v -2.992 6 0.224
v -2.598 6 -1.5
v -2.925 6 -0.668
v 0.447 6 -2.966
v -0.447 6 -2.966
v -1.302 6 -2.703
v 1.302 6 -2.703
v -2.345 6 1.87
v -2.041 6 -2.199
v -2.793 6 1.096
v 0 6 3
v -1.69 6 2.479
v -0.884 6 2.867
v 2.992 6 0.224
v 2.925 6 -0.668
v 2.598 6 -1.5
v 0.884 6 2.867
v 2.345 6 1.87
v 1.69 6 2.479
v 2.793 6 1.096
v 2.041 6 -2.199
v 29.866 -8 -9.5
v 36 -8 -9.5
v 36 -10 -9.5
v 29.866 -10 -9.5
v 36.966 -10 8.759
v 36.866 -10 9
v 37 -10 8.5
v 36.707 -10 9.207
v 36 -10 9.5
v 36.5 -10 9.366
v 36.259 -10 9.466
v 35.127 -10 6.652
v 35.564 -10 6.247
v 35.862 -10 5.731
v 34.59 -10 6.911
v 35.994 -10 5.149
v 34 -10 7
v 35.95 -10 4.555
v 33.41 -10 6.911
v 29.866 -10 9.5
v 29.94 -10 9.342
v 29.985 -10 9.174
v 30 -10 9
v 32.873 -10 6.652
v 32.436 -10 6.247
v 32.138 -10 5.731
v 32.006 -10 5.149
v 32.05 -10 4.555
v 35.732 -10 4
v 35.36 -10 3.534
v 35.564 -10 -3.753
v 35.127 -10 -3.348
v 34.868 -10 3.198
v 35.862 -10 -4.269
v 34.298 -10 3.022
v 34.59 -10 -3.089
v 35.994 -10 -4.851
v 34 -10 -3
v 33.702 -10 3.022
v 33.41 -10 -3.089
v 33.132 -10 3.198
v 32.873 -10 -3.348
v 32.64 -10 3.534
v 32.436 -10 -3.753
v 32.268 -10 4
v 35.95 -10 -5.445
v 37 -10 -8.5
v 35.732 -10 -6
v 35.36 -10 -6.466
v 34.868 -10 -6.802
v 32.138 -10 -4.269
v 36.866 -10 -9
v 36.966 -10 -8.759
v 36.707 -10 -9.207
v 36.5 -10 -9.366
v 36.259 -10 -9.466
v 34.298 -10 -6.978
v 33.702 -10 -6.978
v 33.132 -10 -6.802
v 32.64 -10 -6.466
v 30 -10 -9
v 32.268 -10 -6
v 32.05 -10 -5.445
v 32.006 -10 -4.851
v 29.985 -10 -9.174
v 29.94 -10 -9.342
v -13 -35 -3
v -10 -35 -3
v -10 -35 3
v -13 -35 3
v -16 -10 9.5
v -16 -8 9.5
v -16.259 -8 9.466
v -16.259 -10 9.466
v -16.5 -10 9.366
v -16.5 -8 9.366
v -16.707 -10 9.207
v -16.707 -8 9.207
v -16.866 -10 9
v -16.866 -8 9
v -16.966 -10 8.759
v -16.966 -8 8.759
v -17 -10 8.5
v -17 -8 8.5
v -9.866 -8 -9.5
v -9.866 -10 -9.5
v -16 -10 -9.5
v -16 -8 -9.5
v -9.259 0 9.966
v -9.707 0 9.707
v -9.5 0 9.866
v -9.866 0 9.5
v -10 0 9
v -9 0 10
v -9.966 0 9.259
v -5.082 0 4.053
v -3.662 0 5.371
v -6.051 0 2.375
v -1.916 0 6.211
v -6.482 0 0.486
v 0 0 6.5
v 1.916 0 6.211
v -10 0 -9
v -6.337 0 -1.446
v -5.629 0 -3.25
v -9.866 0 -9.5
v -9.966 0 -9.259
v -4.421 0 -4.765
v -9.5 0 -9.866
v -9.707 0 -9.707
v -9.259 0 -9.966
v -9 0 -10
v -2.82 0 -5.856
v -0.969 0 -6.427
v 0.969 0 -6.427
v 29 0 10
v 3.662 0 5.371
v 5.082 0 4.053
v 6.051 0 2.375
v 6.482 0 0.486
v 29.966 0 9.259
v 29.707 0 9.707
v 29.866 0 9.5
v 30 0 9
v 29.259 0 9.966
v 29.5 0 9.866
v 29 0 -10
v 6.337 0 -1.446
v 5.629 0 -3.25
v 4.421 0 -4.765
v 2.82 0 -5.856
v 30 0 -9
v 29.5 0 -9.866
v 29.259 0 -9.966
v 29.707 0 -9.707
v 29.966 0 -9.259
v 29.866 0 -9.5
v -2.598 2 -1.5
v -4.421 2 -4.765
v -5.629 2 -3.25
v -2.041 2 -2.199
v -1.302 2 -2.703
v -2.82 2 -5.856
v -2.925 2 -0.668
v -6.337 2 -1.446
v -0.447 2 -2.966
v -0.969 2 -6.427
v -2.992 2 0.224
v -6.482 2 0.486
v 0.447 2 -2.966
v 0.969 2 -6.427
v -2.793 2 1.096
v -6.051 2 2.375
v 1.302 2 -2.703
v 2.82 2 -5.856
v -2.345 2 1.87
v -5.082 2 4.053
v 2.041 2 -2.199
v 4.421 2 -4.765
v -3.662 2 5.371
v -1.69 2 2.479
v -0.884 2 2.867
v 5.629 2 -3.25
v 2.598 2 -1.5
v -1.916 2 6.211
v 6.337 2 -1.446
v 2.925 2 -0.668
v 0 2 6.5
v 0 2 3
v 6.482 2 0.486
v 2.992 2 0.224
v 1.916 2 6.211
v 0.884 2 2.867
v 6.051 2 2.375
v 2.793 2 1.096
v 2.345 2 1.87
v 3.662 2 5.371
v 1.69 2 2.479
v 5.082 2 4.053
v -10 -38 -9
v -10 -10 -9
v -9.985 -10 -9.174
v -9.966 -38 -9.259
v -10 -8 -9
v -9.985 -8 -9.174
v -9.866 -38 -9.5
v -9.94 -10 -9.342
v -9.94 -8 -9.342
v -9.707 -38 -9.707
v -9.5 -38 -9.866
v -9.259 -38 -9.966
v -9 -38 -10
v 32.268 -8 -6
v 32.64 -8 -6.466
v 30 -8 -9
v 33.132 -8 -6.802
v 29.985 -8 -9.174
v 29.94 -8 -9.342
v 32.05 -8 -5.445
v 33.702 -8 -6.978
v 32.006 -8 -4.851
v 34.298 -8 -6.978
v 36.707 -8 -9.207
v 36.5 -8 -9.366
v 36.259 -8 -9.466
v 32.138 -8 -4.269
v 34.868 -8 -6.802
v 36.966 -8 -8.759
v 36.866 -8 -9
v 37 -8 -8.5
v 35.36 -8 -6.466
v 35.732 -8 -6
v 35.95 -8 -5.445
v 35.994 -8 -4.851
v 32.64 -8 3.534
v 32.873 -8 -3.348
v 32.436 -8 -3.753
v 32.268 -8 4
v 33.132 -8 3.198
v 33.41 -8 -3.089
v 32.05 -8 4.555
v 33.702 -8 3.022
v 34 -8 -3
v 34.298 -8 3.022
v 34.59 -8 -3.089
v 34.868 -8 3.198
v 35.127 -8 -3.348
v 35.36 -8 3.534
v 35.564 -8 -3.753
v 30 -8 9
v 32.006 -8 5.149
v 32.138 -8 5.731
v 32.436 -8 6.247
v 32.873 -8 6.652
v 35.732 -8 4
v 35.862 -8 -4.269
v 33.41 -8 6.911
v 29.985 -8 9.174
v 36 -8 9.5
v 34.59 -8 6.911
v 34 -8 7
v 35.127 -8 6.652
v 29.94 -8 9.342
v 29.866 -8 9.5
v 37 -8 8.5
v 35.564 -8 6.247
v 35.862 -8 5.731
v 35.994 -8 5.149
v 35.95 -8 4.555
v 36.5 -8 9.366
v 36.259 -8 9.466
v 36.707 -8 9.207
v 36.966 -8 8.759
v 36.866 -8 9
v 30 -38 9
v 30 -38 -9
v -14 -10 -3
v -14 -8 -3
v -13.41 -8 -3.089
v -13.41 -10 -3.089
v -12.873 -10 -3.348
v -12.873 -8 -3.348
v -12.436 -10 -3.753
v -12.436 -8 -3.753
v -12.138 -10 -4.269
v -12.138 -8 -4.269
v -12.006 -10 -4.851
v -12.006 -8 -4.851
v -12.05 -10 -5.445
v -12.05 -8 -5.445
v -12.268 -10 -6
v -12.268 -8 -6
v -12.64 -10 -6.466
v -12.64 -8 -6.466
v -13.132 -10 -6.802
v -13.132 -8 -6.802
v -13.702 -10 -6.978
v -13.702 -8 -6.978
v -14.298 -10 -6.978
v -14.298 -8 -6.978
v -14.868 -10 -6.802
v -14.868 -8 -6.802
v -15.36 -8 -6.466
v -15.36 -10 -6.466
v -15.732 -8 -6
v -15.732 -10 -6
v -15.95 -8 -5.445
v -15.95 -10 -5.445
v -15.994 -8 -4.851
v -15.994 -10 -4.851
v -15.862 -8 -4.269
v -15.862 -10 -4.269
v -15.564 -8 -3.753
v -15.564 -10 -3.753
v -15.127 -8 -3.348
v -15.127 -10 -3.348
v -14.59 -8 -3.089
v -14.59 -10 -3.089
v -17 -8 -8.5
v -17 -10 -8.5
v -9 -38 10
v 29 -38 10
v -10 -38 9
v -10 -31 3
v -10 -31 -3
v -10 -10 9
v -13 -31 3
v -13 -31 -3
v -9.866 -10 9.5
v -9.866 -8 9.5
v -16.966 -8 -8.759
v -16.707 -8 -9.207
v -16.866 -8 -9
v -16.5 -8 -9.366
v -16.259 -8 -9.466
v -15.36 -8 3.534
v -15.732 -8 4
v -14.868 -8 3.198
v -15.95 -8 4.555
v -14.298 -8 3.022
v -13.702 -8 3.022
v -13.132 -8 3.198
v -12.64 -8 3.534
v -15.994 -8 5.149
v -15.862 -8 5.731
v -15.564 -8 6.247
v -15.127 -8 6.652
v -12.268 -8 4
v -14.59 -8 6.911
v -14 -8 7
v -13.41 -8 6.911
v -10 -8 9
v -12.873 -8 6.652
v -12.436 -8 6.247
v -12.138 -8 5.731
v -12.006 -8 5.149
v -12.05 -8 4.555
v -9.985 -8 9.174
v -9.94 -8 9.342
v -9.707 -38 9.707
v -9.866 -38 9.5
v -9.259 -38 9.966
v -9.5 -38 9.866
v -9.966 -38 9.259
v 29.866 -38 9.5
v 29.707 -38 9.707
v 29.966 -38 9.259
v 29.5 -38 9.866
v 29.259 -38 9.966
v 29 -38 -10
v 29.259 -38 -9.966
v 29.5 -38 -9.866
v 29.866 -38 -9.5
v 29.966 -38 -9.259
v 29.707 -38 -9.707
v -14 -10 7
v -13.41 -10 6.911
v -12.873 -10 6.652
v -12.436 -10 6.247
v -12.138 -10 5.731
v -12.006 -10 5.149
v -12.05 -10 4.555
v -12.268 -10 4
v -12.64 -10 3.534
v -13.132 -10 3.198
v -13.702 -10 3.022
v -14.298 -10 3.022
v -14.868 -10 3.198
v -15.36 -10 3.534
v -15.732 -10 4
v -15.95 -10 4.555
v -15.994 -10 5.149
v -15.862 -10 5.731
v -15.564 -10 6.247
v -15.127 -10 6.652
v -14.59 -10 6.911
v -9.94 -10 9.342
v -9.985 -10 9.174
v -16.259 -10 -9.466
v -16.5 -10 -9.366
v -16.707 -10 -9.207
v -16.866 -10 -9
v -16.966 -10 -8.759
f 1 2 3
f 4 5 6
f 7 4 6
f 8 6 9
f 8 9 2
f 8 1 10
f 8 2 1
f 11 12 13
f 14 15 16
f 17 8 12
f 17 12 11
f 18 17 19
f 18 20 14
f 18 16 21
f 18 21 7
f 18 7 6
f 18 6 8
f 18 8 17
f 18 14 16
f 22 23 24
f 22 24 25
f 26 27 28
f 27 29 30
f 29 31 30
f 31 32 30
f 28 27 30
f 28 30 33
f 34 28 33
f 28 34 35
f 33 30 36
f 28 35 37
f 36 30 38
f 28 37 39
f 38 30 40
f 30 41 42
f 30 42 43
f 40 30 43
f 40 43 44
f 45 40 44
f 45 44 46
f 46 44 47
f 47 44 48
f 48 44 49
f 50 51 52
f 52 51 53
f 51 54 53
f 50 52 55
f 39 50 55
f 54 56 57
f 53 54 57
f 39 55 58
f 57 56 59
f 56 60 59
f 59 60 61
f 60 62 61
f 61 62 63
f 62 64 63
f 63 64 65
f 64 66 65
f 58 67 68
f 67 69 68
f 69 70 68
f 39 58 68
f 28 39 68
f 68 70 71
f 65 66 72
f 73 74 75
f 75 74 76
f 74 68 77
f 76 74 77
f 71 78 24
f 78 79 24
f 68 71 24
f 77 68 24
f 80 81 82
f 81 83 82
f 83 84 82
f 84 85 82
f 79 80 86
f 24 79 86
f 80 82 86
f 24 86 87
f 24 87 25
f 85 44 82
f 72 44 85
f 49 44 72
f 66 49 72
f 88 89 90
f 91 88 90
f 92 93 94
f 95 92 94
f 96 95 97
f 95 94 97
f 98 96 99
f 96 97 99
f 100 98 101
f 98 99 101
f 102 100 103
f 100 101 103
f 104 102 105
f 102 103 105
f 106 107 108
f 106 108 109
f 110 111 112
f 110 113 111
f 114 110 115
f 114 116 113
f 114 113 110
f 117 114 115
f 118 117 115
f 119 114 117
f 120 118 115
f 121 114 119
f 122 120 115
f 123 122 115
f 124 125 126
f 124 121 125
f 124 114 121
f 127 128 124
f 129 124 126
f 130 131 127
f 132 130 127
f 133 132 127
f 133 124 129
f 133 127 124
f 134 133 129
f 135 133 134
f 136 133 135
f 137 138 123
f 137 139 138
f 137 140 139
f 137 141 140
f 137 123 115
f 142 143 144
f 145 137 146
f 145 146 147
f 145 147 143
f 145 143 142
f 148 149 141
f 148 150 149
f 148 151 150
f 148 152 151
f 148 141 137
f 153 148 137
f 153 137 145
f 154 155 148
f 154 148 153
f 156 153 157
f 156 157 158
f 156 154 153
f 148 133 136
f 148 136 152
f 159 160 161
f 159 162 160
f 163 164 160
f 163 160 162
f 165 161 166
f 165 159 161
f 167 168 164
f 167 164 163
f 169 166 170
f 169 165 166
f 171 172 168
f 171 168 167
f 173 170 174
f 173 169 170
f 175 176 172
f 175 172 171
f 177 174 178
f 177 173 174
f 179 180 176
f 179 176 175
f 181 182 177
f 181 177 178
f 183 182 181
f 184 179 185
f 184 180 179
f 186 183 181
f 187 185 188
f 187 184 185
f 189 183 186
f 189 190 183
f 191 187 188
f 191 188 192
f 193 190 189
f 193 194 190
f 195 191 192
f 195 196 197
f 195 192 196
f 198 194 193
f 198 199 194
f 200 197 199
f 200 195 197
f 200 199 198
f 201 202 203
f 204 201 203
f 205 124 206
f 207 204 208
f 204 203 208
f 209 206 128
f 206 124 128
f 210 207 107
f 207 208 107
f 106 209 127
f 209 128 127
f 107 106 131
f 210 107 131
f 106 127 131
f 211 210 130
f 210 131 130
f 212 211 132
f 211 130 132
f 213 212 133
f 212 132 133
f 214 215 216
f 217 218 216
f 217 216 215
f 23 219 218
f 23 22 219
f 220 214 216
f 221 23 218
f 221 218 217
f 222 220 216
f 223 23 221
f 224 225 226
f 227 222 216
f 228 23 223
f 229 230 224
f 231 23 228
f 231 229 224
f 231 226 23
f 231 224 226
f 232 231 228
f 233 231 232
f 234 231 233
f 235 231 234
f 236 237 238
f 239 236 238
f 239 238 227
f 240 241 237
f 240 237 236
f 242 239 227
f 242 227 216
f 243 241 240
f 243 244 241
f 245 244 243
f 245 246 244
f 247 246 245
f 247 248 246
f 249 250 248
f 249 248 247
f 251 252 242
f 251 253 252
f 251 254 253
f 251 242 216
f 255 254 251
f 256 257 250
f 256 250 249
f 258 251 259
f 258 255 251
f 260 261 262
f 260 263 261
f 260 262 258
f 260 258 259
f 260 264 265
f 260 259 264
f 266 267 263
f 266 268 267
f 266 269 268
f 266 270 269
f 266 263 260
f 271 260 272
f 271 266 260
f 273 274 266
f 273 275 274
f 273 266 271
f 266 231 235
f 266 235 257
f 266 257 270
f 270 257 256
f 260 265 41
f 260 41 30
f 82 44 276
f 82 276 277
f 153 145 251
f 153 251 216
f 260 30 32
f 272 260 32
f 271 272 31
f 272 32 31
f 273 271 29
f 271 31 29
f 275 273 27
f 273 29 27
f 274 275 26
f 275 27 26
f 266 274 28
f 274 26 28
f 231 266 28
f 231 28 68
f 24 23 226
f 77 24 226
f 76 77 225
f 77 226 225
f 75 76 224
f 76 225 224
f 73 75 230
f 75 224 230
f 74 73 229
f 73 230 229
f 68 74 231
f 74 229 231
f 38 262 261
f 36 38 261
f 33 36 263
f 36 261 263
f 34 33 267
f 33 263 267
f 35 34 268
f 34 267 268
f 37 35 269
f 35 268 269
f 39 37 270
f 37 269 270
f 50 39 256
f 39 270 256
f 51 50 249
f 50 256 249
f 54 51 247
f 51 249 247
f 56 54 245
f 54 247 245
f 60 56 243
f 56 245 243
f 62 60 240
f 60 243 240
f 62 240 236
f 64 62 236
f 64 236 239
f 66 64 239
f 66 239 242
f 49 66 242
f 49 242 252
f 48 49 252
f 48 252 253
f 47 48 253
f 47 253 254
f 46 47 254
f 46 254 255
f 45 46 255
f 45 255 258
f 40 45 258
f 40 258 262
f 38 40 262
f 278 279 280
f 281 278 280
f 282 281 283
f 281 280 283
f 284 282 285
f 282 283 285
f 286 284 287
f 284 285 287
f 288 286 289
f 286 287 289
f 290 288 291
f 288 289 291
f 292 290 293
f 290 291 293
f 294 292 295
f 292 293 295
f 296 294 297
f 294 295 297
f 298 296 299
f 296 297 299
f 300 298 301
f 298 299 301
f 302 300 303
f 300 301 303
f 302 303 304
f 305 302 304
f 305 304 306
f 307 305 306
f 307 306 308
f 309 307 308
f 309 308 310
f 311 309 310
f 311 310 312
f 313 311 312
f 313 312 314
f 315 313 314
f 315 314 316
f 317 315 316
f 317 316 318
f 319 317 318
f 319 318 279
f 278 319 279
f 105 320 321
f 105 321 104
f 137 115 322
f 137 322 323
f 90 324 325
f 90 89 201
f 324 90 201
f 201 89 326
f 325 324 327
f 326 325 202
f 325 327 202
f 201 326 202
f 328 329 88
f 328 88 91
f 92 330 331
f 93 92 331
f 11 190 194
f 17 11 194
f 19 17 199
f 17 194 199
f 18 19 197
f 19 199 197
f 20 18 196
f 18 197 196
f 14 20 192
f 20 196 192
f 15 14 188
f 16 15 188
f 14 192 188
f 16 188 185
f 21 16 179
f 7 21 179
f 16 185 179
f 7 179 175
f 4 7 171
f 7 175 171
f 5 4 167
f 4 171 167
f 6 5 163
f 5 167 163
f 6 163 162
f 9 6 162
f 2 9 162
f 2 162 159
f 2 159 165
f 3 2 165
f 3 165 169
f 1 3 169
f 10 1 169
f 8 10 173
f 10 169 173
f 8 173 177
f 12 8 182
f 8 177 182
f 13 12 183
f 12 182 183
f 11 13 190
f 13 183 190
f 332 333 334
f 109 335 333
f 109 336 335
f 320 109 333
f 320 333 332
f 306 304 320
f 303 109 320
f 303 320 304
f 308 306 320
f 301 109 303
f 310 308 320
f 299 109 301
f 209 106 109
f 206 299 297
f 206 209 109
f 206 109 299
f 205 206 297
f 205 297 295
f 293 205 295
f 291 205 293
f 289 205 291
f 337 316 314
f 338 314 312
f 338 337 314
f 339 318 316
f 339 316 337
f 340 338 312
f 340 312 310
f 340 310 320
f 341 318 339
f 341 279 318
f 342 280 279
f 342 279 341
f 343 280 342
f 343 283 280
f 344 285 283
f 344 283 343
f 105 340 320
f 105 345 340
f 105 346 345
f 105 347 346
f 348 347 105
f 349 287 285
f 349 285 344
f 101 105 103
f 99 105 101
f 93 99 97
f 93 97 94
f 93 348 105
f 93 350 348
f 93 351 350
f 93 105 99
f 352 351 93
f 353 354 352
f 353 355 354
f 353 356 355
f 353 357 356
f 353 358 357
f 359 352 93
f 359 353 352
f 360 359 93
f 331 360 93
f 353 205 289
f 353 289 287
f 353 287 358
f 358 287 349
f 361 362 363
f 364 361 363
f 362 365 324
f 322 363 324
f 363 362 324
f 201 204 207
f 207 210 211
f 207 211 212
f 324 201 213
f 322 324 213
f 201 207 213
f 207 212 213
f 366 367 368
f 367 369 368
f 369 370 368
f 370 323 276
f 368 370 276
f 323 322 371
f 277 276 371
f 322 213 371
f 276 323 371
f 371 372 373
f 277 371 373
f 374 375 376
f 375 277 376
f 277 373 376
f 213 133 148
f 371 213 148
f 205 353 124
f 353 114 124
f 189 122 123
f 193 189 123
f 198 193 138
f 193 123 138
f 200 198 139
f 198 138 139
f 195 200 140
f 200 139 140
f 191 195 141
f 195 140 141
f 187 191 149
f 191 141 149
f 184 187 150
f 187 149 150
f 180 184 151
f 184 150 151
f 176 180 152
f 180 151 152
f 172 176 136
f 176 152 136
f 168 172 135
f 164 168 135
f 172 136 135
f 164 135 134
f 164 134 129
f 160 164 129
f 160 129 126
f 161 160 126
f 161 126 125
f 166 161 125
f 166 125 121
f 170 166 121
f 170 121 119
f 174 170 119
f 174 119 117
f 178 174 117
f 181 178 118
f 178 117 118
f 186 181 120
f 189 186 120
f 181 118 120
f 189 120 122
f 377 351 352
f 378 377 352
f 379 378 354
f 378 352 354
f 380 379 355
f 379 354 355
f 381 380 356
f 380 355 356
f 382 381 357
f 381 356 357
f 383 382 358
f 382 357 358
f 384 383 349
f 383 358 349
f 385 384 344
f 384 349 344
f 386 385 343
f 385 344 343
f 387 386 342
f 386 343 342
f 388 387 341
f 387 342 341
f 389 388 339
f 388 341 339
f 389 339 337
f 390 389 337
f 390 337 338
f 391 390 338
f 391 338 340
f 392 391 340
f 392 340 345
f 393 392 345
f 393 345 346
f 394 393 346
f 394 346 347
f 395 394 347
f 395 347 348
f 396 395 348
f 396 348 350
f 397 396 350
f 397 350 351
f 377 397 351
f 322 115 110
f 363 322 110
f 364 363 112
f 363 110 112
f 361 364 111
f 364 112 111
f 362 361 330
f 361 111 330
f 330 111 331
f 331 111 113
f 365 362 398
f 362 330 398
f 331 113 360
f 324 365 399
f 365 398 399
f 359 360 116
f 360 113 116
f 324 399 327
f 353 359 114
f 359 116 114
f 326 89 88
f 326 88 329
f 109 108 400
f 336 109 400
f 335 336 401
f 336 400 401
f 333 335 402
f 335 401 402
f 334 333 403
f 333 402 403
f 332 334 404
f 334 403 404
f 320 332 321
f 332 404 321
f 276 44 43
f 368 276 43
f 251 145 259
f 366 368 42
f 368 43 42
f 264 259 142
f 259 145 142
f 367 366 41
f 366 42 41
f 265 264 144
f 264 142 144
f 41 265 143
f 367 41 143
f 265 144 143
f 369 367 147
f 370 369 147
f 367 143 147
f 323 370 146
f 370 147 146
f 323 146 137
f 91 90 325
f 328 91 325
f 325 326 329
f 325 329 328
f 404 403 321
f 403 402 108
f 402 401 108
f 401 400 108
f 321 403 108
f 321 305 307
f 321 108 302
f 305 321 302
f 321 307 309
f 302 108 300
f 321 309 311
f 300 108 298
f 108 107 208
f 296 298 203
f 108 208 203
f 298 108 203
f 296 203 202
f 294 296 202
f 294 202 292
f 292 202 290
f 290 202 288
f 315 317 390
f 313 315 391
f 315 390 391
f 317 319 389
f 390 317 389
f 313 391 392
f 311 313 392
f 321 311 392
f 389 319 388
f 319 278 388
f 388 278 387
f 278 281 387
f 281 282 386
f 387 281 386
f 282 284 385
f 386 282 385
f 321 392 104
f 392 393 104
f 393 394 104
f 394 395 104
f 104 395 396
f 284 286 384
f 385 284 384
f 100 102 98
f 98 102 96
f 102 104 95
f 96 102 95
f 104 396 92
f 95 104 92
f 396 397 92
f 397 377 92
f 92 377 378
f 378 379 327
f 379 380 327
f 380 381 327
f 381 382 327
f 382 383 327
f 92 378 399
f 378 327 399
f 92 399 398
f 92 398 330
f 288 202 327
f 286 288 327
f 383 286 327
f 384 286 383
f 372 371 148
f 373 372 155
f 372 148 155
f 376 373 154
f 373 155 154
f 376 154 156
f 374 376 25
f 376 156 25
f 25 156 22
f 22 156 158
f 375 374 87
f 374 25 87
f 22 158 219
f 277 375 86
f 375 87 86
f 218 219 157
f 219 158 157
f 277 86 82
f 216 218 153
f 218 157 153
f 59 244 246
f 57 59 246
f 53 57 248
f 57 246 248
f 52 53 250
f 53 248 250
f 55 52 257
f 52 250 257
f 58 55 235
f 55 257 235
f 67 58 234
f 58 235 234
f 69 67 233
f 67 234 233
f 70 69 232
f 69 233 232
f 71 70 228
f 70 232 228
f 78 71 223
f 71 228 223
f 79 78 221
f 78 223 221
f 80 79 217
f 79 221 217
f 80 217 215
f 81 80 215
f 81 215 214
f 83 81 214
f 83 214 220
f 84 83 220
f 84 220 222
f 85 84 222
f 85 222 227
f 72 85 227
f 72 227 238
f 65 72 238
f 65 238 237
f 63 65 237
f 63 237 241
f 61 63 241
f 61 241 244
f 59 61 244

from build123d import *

# Parameters (mm, degrees)
SKETCH_1_W          = 40
SKETCH_1_H          = 20
EXTRUDE_455_DEPTH   = 38
SKETCH_2_R          = 6.5
EXTRUDE_589_DEPTH   = 2
SKETCH_3_R          = 3
EXTRUDE_676_DEPTH   = 4
SKETCH_4_W          = 19
SKETCH_4_H          = 2
EXTRUDE_1_DEPTH     = 7
SKETCH_6_W          = 19
SKETCH_6_H          = 2
EXTRUDE_2_DEPTH     = 7
SKETCH_7_R          = 2
CUT_EXTRUDE_1_DEPTH = 49.672374095
SKETCH_8_R          = 2
CUT_EXTRUDE_2_DEPTH = 49.672374095
SKETCH_9_W          = 6
SKETCH_9_H          = 4
EXTRUDE_1701_DEPTH  = 3
FILLET_1_R          = 1


with BuildPart() as part:
    # Эскиз1 → Extrude 455 (new body)
    with BuildSketch(Plane(origin=(0, 0, 0), x_dir=(1, 0, 0), z_dir=(0, 1, 0))):
        with Locations((10, 0)):
            Rectangle(SKETCH_1_W, SKETCH_1_H)
    extrude(amount=-EXTRUDE_455_DEPTH)

    # Эскиз2 → Extrude 589 (add)
    with BuildSketch(Plane(origin=(0, 0, 0), x_dir=(1, 0, 0), z_dir=(0, 1, 0))):
        with Locations(Location((0, 0, 0), (0, 0, 270))):
            Circle(SKETCH_2_R)
    extrude(amount=EXTRUDE_589_DEPTH)

    # Эскиз3 → Extrude 676 (add)
    with BuildSketch(Plane(origin=(0, 2, 0), x_dir=(1, 0, 0), z_dir=(0, 1, 0))):
        with Locations(Location((0, 0, 0), (0, 0, 270))):
            Circle(SKETCH_3_R)
    extrude(amount=EXTRUDE_676_DEPTH)

    # Эскиз4 → крепления 1 (add)
    with BuildSketch(Plane(origin=(30, 0, 0), x_dir=(0, 0, -1), z_dir=(1, 0, 0))):
        with Locations((0, -9)):
            Rectangle(SKETCH_4_W, SKETCH_4_H)
    extrude(amount=EXTRUDE_1_DEPTH)

    # Эскиз6 → крепления 2 (add)
    with BuildSketch(Plane.ZY.offset(10)):
        with Locations((0, -9)):
            Rectangle(SKETCH_6_W, SKETCH_6_H)
    extrude(amount=EXTRUDE_2_DEPTH)

    # Эскиз7 → отверстия 1 (cut, through all)
    with BuildSketch(Plane(origin=(0, -8, 0), x_dir=(1, 0, 0), z_dir=(0, 1, 0))):
        with Locations(Location((34, 5, 0), (0, 0, 270))):
            Circle(SKETCH_7_R)
        with Locations(Location((34, -5, 0), (0, 0, 270))):
            Circle(SKETCH_7_R)
    extrude(amount=-CUT_EXTRUDE_1_DEPTH, mode=Mode.SUBTRACT)

    # Эскиз8 → отверстия 2 (cut, through all)
    with BuildSketch(Plane(origin=(0, -8, 0), x_dir=(1, 0, 0), z_dir=(0, 1, 0))):
        with Locations(Location((-14, 5, 0), (0, 0, 270))):
            Circle(SKETCH_8_R)
        with Locations(Location((-14, -5, 0), (0, 0, 270))):
            Circle(SKETCH_8_R)
    extrude(amount=-CUT_EXTRUDE_2_DEPTH, mode=Mode.SUBTRACT)

    # Эскиз9 → Extrude 1701 (add)
    with BuildSketch(Plane.ZY.offset(10)):
        with Locations((0, -33)):
            Rectangle(SKETCH_9_W, SKETCH_9_H)
    extrude(amount=EXTRUDE_1701_DEPTH)

    # Скругление1
    # the kernel refuses this fillet: 1 mm, written as the material it takes off along each edge
    with BuildSketch(Plane(origin=(30, 2.5, 10), x_dir=(0, 0, -1), z_dir=(0, -1, 0))) as fillet_1_piece_1_section:
        with BuildLine():
            CenterArc((FILLET_1_R, -FILLET_1_R), FILLET_1_R, 90, 90)
            Line((0, -FILLET_1_R), (0, 0))
            Line((0, 0), (FILLET_1_R, 0))
        make_face()
    fillet_1_piece_1 = extrude(amount=43, mode=Mode.PRIVATE)
    fillet_1_piece_1 = split(fillet_1_piece_1, bisect_by=Plane(origin=(29.975991618, -8, 9.336749215), z_dir=(0, 1, 0)), keep=Keep.TOP, mode=Mode.PRIVATE)
    fillet_1_piece_1 = split(fillet_1_piece_1, bisect_by=Plane(origin=(29.975991618, -2.75, 9.5), z_dir=(0, 0, -1)), keep=Keep.TOP, mode=Mode.PRIVATE)
    add(fillet_1_piece_1, mode=Mode.SUBTRACT)
    with BuildSketch(Plane(origin=(30, 2.5, 10), x_dir=(0, 0, -1), z_dir=(0, -1, 0))) as fillet_1_piece_2_section:
        with BuildLine():
            CenterArc((FILLET_1_R, -FILLET_1_R), FILLET_1_R, 90, 90)
            Line((0, -FILLET_1_R), (0, 0))
            Line((0, 0), (FILLET_1_R, 0))
        make_face()
    fillet_1_piece_2 = extrude(amount=43, mode=Mode.PRIVATE)
    fillet_1_piece_2 = split(fillet_1_piece_2, bisect_by=Plane(origin=(29.74487994, -8, 9.835608236), z_dir=(0, 1, 0)), keep=Keep.TOP, mode=Mode.PRIVATE)
    fillet_1_piece_2 = split(fillet_1_piece_2, bisect_by=Plane(origin=(29.74487994, -2.75, 9.5), z_dir=(0, 0, 1)), keep=Keep.TOP, mode=Mode.PRIVATE)
    add(fillet_1_piece_2, mode=Mode.SUBTRACT)
    with BuildSketch(Plane(origin=(30, 2.5, 10), x_dir=(0, 0, -1), z_dir=(0, -1, 0))) as fillet_1_piece_3_section:
        with BuildLine():
            CenterArc((FILLET_1_R, -FILLET_1_R), FILLET_1_R, 90, 90)
            Line((0, -FILLET_1_R), (0, 0))
            Line((0, 0), (FILLET_1_R, 0))
        make_face()
    fillet_1_piece_3 = extrude(amount=43, mode=Mode.PRIVATE)
    fillet_1_piece_3 = split(fillet_1_piece_3, bisect_by=Plane(origin=(29.74487994, -8, 9.835608236), z_dir=(0, -1, 0)), keep=Keep.TOP, mode=Mode.PRIVATE)
    fillet_1_piece_3 = split(fillet_1_piece_3, bisect_by=Plane(origin=(29.74487994, -10, 9.835608236), z_dir=(0, 1, 0)), keep=Keep.TOP, mode=Mode.PRIVATE)
    fillet_1_piece_3 = split(fillet_1_piece_3, bisect_by=Plane(origin=(29.74487994, -9, 9.5), z_dir=(0, 0, 1)), keep=Keep.TOP, mode=Mode.PRIVATE)
    add(fillet_1_piece_3, mode=Mode.SUBTRACT)
    with BuildSketch(Plane(origin=(30, 2.5, 10), x_dir=(0, 0, -1), z_dir=(0, -1, 0))) as fillet_1_piece_4_section:
        with BuildLine():
            CenterArc((FILLET_1_R, -FILLET_1_R), FILLET_1_R, 90, 90)
            Line((0, -FILLET_1_R), (0, 0))
            Line((0, 0), (FILLET_1_R, 0))
        make_face()
    fillet_1_piece_4 = extrude(amount=43, mode=Mode.PRIVATE)
    fillet_1_piece_4 = split(fillet_1_piece_4, bisect_by=Plane(origin=(29.975991618, -10, 9.336749215), z_dir=(0, -1, 0)), keep=Keep.TOP, mode=Mode.PRIVATE)
    fillet_1_piece_4 = split(fillet_1_piece_4, bisect_by=Plane(origin=(29.975991618, -25.25, 9.5), z_dir=(0, 0, -1)), keep=Keep.TOP, mode=Mode.PRIVATE)
    add(fillet_1_piece_4, mode=Mode.SUBTRACT)
    with BuildSketch(Plane(origin=(30, 2.5, 10), x_dir=(0, 0, -1), z_dir=(0, -1, 0))) as fillet_1_piece_5_section:
        with BuildLine():
            CenterArc((FILLET_1_R, -FILLET_1_R), FILLET_1_R, 90, 90)
            Line((0, -FILLET_1_R), (0, 0))
            Line((0, 0), (FILLET_1_R, 0))
        make_face()
    fillet_1_piece_5 = extrude(amount=43, mode=Mode.PRIVATE)
    fillet_1_piece_5 = split(fillet_1_piece_5, bisect_by=Plane(origin=(29.74487994, -10, 9.835608236), z_dir=(0, -1, 0)), keep=Keep.TOP, mode=Mode.PRIVATE)
    fillet_1_piece_5 = split(fillet_1_piece_5, bisect_by=Plane(origin=(29.74487994, -25.25, 9.5), z_dir=(0, 0, 1)), keep=Keep.TOP, mode=Mode.PRIVATE)
    add(fillet_1_piece_5, mode=Mode.SUBTRACT)
    with BuildSketch(Plane(origin=(30, 2.5, -10), x_dir=(-1, 0, 0), z_dir=(0, -1, 0))) as fillet_1_piece_6_section:
        with BuildLine():
            CenterArc((FILLET_1_R, -FILLET_1_R), FILLET_1_R, 90, 90)
            Line((0, -FILLET_1_R), (0, 0))
            Line((0, 0), (FILLET_1_R, 0))
        make_face()
    fillet_1_piece_6 = extrude(amount=43, mode=Mode.PRIVATE)
    fillet_1_piece_6 = split(fillet_1_piece_6, bisect_by=Plane(origin=(29.74487994, -8, -9.835608236), z_dir=(0, 1, 0)), keep=Keep.TOP, mode=Mode.PRIVATE)
    fillet_1_piece_6 = split(fillet_1_piece_6, bisect_by=Plane(origin=(29.74487994, -2.75, -9.5), z_dir=(0, 0, -1)), keep=Keep.TOP, mode=Mode.PRIVATE)
    add(fillet_1_piece_6, mode=Mode.SUBTRACT)
    with BuildSketch(Plane(origin=(30, 2.5, -10), x_dir=(-1, 0, 0), z_dir=(0, -1, 0))) as fillet_1_piece_7_section:
        with BuildLine():
            CenterArc((FILLET_1_R, -FILLET_1_R), FILLET_1_R, 90, 90)
            Line((0, -FILLET_1_R), (0, 0))
            Line((0, 0), (FILLET_1_R, 0))
        make_face()
    fillet_1_piece_7 = extrude(amount=43, mode=Mode.PRIVATE)
    fillet_1_piece_7 = split(fillet_1_piece_7, bisect_by=Plane(origin=(29.975991618, -8, -9.336749215), z_dir=(0, 1, 0)), keep=Keep.TOP, mode=Mode.PRIVATE)
    fillet_1_piece_7 = split(fillet_1_piece_7, bisect_by=Plane(origin=(29.975991618, -2.75, -9.5), z_dir=(0, 0, 1)), keep=Keep.TOP, mode=Mode.PRIVATE)
    add(fillet_1_piece_7, mode=Mode.SUBTRACT)
    with BuildSketch(Plane(origin=(30, 2.5, -10), x_dir=(-1, 0, 0), z_dir=(0, -1, 0))) as fillet_1_piece_8_section:
        with BuildLine():
            CenterArc((FILLET_1_R, -FILLET_1_R), FILLET_1_R, 90, 90)
            Line((0, -FILLET_1_R), (0, 0))
            Line((0, 0), (FILLET_1_R, 0))
        make_face()
    fillet_1_piece_8 = extrude(amount=43, mode=Mode.PRIVATE)
    fillet_1_piece_8 = split(fillet_1_piece_8, bisect_by=Plane(origin=(29.74487994, -8, -9.835608236), z_dir=(0, -1, 0)), keep=Keep.TOP, mode=Mode.PRIVATE)
    fillet_1_piece_8 = split(fillet_1_piece_8, bisect_by=Plane(origin=(29.74487994, -9, -9.5), z_dir=(0, 0, -1)), keep=Keep.TOP, mode=Mode.PRIVATE)
    fillet_1_piece_8 = split(fillet_1_piece_8, bisect_by=Plane(origin=(29.74487994, -10, -9.835608236), z_dir=(0, 1, 0)), keep=Keep.TOP, mode=Mode.PRIVATE)
    add(fillet_1_piece_8, mode=Mode.SUBTRACT)
    with BuildSketch(Plane(origin=(30, 2.5, -10), x_dir=(-1, 0, 0), z_dir=(0, -1, 0))) as fillet_1_piece_9_section:
        with BuildLine():
            CenterArc((FILLET_1_R, -FILLET_1_R), FILLET_1_R, 90, 90)
            Line((0, -FILLET_1_R), (0, 0))
            Line((0, 0), (FILLET_1_R, 0))
        make_face()
    fillet_1_piece_9 = extrude(amount=43, mode=Mode.PRIVATE)
    fillet_1_piece_9 = split(fillet_1_piece_9, bisect_by=Plane(origin=(29.74487994, -25.25, -9.5), z_dir=(0, 0, -1)), keep=Keep.TOP, mode=Mode.PRIVATE)
    fillet_1_piece_9 = split(fillet_1_piece_9, bisect_by=Plane(origin=(29.74487994, -10, -9.835608236), z_dir=(0, -1, 0)), keep=Keep.TOP, mode=Mode.PRIVATE)
    add(fillet_1_piece_9, mode=Mode.SUBTRACT)
    with BuildSketch(Plane(origin=(30, 2.5, -10), x_dir=(-1, 0, 0), z_dir=(0, -1, 0))) as fillet_1_piece_10_section:
        with BuildLine():
            CenterArc((FILLET_1_R, -FILLET_1_R), FILLET_1_R, 90, 90)
            Line((0, -FILLET_1_R), (0, 0))
            Line((0, 0), (FILLET_1_R, 0))
        make_face()
    fillet_1_piece_10 = extrude(amount=43, mode=Mode.PRIVATE)
    fillet_1_piece_10 = split(fillet_1_piece_10, bisect_by=Plane(origin=(29.975991618, -25.25, -9.5), z_dir=(0, 0, 1)), keep=Keep.TOP, mode=Mode.PRIVATE)
    fillet_1_piece_10 = split(fillet_1_piece_10, bisect_by=Plane(origin=(29.975991618, -10, -9.336749215), z_dir=(0, -1, 0)), keep=Keep.TOP, mode=Mode.PRIVATE)
    add(fillet_1_piece_10, mode=Mode.SUBTRACT)
    with BuildSketch(Plane(origin=(37, -5.5, -9.5), x_dir=(-1, 0, 0), z_dir=(0, -1, 0)), Plane(origin=(37, -12.5, 9.5), x_dir=(-1, 0, 0), z_dir=(0, 1, 0)), Plane(origin=(-17, -12.5, -9.5), x_dir=(1, 0, 0), z_dir=(0, 1, 0)), Plane(origin=(-17, -5.5, 9.5), x_dir=(1, 0, 0), z_dir=(0, -1, 0))) as fillet_1_piece_11:
        with BuildLine():
            CenterArc((FILLET_1_R, -FILLET_1_R), FILLET_1_R, 90, 90)
            Line((0, -FILLET_1_R), (0, 0))
            Line((0, 0), (FILLET_1_R, 0))
        make_face()
    extrude(amount=7, mode=Mode.SUBTRACT)
    with BuildSketch(Plane(origin=(-10, 2.5, 10), x_dir=(0, 0, -1), z_dir=(0, -1, 0))) as fillet_1_piece_12_section:
        with BuildLine():
            CenterArc((FILLET_1_R, FILLET_1_R), FILLET_1_R, 180, 90)
            Line((0, FILLET_1_R), (0, 0))
            Line((0, 0), (FILLET_1_R, 0))
        make_face()
    fillet_1_piece_12 = extrude(amount=43, mode=Mode.PRIVATE)
    fillet_1_piece_12 = split(fillet_1_piece_12, bisect_by=Plane(origin=(-9.975991618, -8, 9.336749215), z_dir=(0, 1, 0)), keep=Keep.TOP, mode=Mode.PRIVATE)
    fillet_1_piece_12 = split(fillet_1_piece_12, bisect_by=Plane(origin=(-9.975991618, -2.75, 9.5), z_dir=(0, 0, -1)), keep=Keep.TOP, mode=Mode.PRIVATE)
    add(fillet_1_piece_12, mode=Mode.SUBTRACT)
    with BuildSketch(Plane(origin=(-10, 2.5, 10), x_dir=(0, 0, -1), z_dir=(0, -1, 0))) as fillet_1_piece_13_section:
        with BuildLine():
            CenterArc((FILLET_1_R, FILLET_1_R), FILLET_1_R, 180, 90)
            Line((0, FILLET_1_R), (0, 0))
            Line((0, 0), (FILLET_1_R, 0))
        make_face()
    fillet_1_piece_13 = extrude(amount=43, mode=Mode.PRIVATE)
    fillet_1_piece_13 = split(fillet_1_piece_13, bisect_by=Plane(origin=(-9.74487994, -8, 9.835608236), z_dir=(0, 1, 0)), keep=Keep.TOP, mode=Mode.PRIVATE)
    fillet_1_piece_13 = split(fillet_1_piece_13, bisect_by=Plane(origin=(-9.74487994, -2.75, 9.5), z_dir=(0, 0, 1)), keep=Keep.TOP, mode=Mode.PRIVATE)
    add(fillet_1_piece_13, mode=Mode.SUBTRACT)
    with BuildSketch(Plane(origin=(-10, 2.5, 10), x_dir=(0, 0, -1), z_dir=(0, -1, 0))) as fillet_1_piece_14_section:
        with BuildLine():
            CenterArc((FILLET_1_R, FILLET_1_R), FILLET_1_R, 180, 90)
            Line((0, FILLET_1_R), (0, 0))
            Line((0, 0), (FILLET_1_R, 0))
        make_face()
    fillet_1_piece_14 = extrude(amount=43, mode=Mode.PRIVATE)
    fillet_1_piece_14 = split(fillet_1_piece_14, bisect_by=Plane(origin=(-9.74487994, -8, 9.835608236), z_dir=(0, -1, 0)), keep=Keep.TOP, mode=Mode.PRIVATE)
    fillet_1_piece_14 = split(fillet_1_piece_14, bisect_by=Plane(origin=(-9.74487994, -9, 9.5), z_dir=(0, 0, 1)), keep=Keep.TOP, mode=Mode.PRIVATE)
    fillet_1_piece_14 = split(fillet_1_piece_14, bisect_by=Plane(origin=(-9.74487994, -10, 9.835608236), z_dir=(0, 1, 0)), keep=Keep.TOP, mode=Mode.PRIVATE)
    add(fillet_1_piece_14, mode=Mode.SUBTRACT)
    with BuildSketch(Plane(origin=(-10, 2.5, 10), x_dir=(0, 0, -1), z_dir=(0, -1, 0))) as fillet_1_piece_15_section:
        with BuildLine():
            CenterArc((FILLET_1_R, FILLET_1_R), FILLET_1_R, 180, 90)
            Line((0, FILLET_1_R), (0, 0))
            Line((0, 0), (FILLET_1_R, 0))
        make_face()
    fillet_1_piece_15 = extrude(amount=43, mode=Mode.PRIVATE)
    fillet_1_piece_15 = split(fillet_1_piece_15, bisect_by=Plane(origin=(-9.975991618, -25.25, 9.5), z_dir=(0, 0, -1)), keep=Keep.TOP, mode=Mode.PRIVATE)
    fillet_1_piece_15 = split(fillet_1_piece_15, bisect_by=Plane(origin=(-9.975991618, -10, 9.336749215), z_dir=(0, -1, 0)), keep=Keep.TOP, mode=Mode.PRIVATE)
    add(fillet_1_piece_15, mode=Mode.SUBTRACT)
    with BuildSketch(Plane(origin=(-10, 2.5, 10), x_dir=(0, 0, -1), z_dir=(0, -1, 0))) as fillet_1_piece_16_section:
        with BuildLine():
            CenterArc((FILLET_1_R, FILLET_1_R), FILLET_1_R, 180, 90)
            Line((0, FILLET_1_R), (0, 0))
            Line((0, 0), (FILLET_1_R, 0))
        make_face()
    fillet_1_piece_16 = extrude(amount=43, mode=Mode.PRIVATE)
    fillet_1_piece_16 = split(fillet_1_piece_16, bisect_by=Plane(origin=(-9.74487994, -25.25, 9.5), z_dir=(0, 0, 1)), keep=Keep.TOP, mode=Mode.PRIVATE)
    fillet_1_piece_16 = split(fillet_1_piece_16, bisect_by=Plane(origin=(-9.74487994, -10, 9.835608236), z_dir=(0, -1, 0)), keep=Keep.TOP, mode=Mode.PRIVATE)
    add(fillet_1_piece_16, mode=Mode.SUBTRACT)
    with BuildSketch(Plane(origin=(-10, 2.5, -10), x_dir=(1, 0, 0), z_dir=(0, -1, 0))) as fillet_1_piece_17_section:
        with BuildLine():
            CenterArc((FILLET_1_R, FILLET_1_R), FILLET_1_R, 180, 90)
            Line((0, FILLET_1_R), (0, 0))
            Line((0, 0), (FILLET_1_R, 0))
        make_face()
    fillet_1_piece_17 = extrude(amount=43, mode=Mode.PRIVATE)
    fillet_1_piece_17 = split(fillet_1_piece_17, bisect_by=Plane(origin=(-9.74487994, -8, -9.835608236), z_dir=(0, 1, 0)), keep=Keep.TOP, mode=Mode.PRIVATE)
    fillet_1_piece_17 = split(fillet_1_piece_17, bisect_by=Plane(origin=(-9.74487994, -2.75, -9.5), z_dir=(0, 0, -1)), keep=Keep.TOP, mode=Mode.PRIVATE)
    add(fillet_1_piece_17, mode=Mode.SUBTRACT)
    with BuildSketch(Plane(origin=(-10, 2.5, -10), x_dir=(1, 0, 0), z_dir=(0, -1, 0))) as fillet_1_piece_18_section:
        with BuildLine():
            CenterArc((FILLET_1_R, FILLET_1_R), FILLET_1_R, 180, 90)
            Line((0, FILLET_1_R), (0, 0))
            Line((0, 0), (FILLET_1_R, 0))
        make_face()
    fillet_1_piece_18 = extrude(amount=43, mode=Mode.PRIVATE)
    fillet_1_piece_18 = split(fillet_1_piece_18, bisect_by=Plane(origin=(-9.975991618, -8, -9.336749215), z_dir=(0, 1, 0)), keep=Keep.TOP, mode=Mode.PRIVATE)
    fillet_1_piece_18 = split(fillet_1_piece_18, bisect_by=Plane(origin=(-9.975991618, -2.75, -9.5), z_dir=(0, 0, 1)), keep=Keep.TOP, mode=Mode.PRIVATE)
    add(fillet_1_piece_18, mode=Mode.SUBTRACT)
    with BuildSketch(Plane(origin=(-10, 2.5, -10), x_dir=(1, 0, 0), z_dir=(0, -1, 0))) as fillet_1_piece_19_section:
        with BuildLine():
            CenterArc((FILLET_1_R, FILLET_1_R), FILLET_1_R, 180, 90)
            Line((0, FILLET_1_R), (0, 0))
            Line((0, 0), (FILLET_1_R, 0))
        make_face()
    fillet_1_piece_19 = extrude(amount=43, mode=Mode.PRIVATE)
    fillet_1_piece_19 = split(fillet_1_piece_19, bisect_by=Plane(origin=(-9.74487994, -8, -9.835608236), z_dir=(0, -1, 0)), keep=Keep.TOP, mode=Mode.PRIVATE)
    fillet_1_piece_19 = split(fillet_1_piece_19, bisect_by=Plane(origin=(-9.74487994, -9, -9.5), z_dir=(0, 0, -1)), keep=Keep.TOP, mode=Mode.PRIVATE)
    fillet_1_piece_19 = split(fillet_1_piece_19, bisect_by=Plane(origin=(-9.74487994, -10, -9.835608236), z_dir=(0, 1, 0)), keep=Keep.TOP, mode=Mode.PRIVATE)
    add(fillet_1_piece_19, mode=Mode.SUBTRACT)
    with BuildSketch(Plane(origin=(-10, 2.5, -10), x_dir=(1, 0, 0), z_dir=(0, -1, 0))) as fillet_1_piece_20_section:
        with BuildLine():
            CenterArc((FILLET_1_R, FILLET_1_R), FILLET_1_R, 180, 90)
            Line((0, FILLET_1_R), (0, 0))
            Line((0, 0), (FILLET_1_R, 0))
        make_face()
    fillet_1_piece_20 = extrude(amount=43, mode=Mode.PRIVATE)
    fillet_1_piece_20 = split(fillet_1_piece_20, bisect_by=Plane(origin=(-9.74487994, -25.25, -9.5), z_dir=(0, 0, -1)), keep=Keep.TOP, mode=Mode.PRIVATE)
    fillet_1_piece_20 = split(fillet_1_piece_20, bisect_by=Plane(origin=(-9.74487994, -10, -9.835608236), z_dir=(0, -1, 0)), keep=Keep.TOP, mode=Mode.PRIVATE)
    add(fillet_1_piece_20, mode=Mode.SUBTRACT)
    with BuildSketch(Plane(origin=(-10, 2.5, -10), x_dir=(1, 0, 0), z_dir=(0, -1, 0))) as fillet_1_piece_21_section:
        with BuildLine():
            CenterArc((FILLET_1_R, FILLET_1_R), FILLET_1_R, 180, 90)
            Line((0, FILLET_1_R), (0, 0))
            Line((0, 0), (FILLET_1_R, 0))
        make_face()
    fillet_1_piece_21 = extrude(amount=43, mode=Mode.PRIVATE)
    fillet_1_piece_21 = split(fillet_1_piece_21, bisect_by=Plane(origin=(-9.975991618, -25.25, -9.5), z_dir=(0, 0, 1)), keep=Keep.TOP, mode=Mode.PRIVATE)
    fillet_1_piece_21 = split(fillet_1_piece_21, bisect_by=Plane(origin=(-9.975991618, -10, -9.336749215), z_dir=(0, -1, 0)), keep=Keep.TOP, mode=Mode.PRIVATE)
    add(fillet_1_piece_21, mode=Mode.SUBTRACT)


solid = part.part
